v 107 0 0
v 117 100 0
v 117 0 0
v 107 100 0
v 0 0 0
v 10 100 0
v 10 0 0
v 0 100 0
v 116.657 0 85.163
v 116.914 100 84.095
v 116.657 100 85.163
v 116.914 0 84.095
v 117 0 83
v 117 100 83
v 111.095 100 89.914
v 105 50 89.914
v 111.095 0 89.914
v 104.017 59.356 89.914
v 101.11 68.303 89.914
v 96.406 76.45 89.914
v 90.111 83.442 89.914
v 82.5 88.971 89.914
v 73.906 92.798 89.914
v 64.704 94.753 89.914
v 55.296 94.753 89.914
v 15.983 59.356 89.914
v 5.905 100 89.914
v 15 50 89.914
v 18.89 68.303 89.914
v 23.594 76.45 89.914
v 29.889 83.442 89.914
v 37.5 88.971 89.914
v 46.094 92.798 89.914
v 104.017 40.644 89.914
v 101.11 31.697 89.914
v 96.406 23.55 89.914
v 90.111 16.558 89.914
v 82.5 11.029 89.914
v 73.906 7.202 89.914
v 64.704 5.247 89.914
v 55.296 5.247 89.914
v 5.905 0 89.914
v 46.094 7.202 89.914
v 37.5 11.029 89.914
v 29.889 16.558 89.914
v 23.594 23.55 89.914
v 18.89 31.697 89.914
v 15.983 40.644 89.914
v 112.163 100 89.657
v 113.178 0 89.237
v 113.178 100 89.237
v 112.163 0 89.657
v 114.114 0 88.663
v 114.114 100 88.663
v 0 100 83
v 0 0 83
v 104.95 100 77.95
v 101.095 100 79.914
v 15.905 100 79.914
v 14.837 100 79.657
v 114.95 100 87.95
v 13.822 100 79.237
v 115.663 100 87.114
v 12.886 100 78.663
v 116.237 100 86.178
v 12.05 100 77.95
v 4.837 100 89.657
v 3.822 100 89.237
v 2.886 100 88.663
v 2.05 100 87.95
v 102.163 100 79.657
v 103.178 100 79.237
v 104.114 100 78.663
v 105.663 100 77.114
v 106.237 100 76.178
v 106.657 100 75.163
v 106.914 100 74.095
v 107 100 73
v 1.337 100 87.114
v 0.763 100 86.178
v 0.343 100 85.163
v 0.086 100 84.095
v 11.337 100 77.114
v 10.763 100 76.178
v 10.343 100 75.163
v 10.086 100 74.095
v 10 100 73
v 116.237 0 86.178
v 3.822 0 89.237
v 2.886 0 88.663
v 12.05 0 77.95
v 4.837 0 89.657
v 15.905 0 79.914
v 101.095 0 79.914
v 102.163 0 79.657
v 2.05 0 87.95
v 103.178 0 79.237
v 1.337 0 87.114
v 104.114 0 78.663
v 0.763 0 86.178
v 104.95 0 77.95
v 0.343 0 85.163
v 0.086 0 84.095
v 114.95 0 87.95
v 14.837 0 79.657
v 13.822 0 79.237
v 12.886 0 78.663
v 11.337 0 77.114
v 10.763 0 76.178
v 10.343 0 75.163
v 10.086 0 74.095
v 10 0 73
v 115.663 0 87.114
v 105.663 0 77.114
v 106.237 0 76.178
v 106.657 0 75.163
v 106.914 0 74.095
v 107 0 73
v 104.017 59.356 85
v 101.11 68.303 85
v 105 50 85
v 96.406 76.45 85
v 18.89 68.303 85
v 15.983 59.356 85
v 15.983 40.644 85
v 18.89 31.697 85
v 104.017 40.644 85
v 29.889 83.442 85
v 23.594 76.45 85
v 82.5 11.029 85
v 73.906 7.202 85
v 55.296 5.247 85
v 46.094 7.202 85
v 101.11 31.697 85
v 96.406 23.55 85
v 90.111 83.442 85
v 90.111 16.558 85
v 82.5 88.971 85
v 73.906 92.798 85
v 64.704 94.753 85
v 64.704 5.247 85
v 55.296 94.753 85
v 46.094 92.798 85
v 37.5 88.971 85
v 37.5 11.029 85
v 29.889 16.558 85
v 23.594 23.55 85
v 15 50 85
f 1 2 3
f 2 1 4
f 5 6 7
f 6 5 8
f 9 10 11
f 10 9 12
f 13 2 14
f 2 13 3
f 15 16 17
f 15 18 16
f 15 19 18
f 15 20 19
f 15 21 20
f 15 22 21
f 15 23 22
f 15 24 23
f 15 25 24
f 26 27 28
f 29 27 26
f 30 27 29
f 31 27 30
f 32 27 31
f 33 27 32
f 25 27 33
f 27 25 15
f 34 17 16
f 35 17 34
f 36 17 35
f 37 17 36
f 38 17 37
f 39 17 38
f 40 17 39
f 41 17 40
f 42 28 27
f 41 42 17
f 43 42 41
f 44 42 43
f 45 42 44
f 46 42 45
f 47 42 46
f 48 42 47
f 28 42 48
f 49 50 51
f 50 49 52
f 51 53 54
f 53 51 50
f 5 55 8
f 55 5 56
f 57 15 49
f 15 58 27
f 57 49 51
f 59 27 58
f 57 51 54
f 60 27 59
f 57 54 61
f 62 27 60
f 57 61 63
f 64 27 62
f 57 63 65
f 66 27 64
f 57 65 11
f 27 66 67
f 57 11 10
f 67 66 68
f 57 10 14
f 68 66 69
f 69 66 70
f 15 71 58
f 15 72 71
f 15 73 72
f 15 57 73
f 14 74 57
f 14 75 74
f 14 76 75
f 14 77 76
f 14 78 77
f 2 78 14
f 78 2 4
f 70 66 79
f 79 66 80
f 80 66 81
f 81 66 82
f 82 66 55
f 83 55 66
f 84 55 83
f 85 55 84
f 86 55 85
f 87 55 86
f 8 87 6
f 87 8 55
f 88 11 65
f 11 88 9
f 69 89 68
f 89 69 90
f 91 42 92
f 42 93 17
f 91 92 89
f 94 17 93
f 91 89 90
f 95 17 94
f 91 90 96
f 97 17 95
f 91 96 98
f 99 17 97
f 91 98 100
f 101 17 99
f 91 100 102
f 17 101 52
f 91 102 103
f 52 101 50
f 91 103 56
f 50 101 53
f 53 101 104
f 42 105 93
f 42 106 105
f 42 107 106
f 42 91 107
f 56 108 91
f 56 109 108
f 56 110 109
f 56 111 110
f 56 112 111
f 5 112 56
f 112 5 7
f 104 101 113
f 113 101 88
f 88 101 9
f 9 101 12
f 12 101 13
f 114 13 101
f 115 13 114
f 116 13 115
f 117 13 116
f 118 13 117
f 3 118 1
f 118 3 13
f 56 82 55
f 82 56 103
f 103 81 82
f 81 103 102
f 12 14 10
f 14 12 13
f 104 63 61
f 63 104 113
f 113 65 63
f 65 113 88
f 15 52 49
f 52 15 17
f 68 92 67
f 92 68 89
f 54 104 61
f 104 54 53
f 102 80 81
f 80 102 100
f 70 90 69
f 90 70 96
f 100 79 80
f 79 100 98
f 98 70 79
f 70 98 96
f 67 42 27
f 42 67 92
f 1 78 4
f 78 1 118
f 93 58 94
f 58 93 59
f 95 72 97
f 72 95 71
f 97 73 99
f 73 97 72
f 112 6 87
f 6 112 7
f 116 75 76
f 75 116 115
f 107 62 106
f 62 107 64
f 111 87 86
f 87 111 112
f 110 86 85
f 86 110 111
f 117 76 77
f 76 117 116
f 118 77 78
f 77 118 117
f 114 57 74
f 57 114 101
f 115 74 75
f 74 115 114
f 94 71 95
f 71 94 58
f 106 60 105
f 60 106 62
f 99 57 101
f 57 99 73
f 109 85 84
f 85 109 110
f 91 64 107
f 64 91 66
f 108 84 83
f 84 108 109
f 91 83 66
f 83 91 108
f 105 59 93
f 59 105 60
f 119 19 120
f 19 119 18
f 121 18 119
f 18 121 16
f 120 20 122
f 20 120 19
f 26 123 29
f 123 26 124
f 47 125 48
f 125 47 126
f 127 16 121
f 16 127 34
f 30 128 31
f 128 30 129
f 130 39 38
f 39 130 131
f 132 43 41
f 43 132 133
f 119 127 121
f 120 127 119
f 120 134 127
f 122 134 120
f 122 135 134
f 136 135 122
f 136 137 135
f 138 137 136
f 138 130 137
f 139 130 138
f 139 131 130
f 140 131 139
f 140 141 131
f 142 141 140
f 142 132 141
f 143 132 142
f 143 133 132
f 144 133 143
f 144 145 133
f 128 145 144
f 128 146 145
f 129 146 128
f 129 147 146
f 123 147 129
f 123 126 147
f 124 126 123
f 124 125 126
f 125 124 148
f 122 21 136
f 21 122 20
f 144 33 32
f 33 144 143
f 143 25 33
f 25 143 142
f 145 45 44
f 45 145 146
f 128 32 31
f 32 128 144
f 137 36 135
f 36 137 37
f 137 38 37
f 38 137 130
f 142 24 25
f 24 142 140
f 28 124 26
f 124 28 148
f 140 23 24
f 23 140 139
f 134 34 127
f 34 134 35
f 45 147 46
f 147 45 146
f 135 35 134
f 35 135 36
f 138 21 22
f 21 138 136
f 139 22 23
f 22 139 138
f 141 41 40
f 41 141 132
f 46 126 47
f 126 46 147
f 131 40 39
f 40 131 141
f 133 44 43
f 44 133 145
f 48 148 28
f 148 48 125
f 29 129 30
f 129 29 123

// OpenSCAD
chairArmWidth=130;
cupHolderLength=100;
cupHolderHeight=90;
widthOfCupHolder=10;
curveRadius=7;
smoothingAmount=10;
diameterOfCup=90;
module cupHolderBase(){
difference(){
hull(){
for(i=[1:smoothingAmount]){
translate([curveRadius-curveRadius*sin(i*90/smoothingAmount),0,0])cube([(cupHolderHeight+2*widthOfCupHolder-curveRadius+2*curveRadius*sin(i*90/smoothingAmount)),cupHolderLength,(cupHolderHeight-curveRadius+curveRadius*cos(i*90/smoothingAmount))]);
}
}
hull(){
for(i=[1:smoothingAmount]){
translate([widthOfCupHolder+curveRadius-curveRadius*sin(i*90/smoothingAmount),-10,-10])cube([(cupHolderHeight-curveRadius+2*curveRadius*sin(i*90/smoothingAmount)),cupHolderLength+20,(cupHolderHeight-widthOfCupHolder-curveRadius+10+curveRadius*cos(i*90/smoothingAmount))]);
}
}
}
}
difference(){
cupHolderBase();

translate([(chairArmWidth-widthOfCupHolder)/2,cupHolderLength/2,cupHolderHeight-widthOfCupHolder/2])cylinder(r=diameterOfCup/2,h=smoothingAmount/2);
}
